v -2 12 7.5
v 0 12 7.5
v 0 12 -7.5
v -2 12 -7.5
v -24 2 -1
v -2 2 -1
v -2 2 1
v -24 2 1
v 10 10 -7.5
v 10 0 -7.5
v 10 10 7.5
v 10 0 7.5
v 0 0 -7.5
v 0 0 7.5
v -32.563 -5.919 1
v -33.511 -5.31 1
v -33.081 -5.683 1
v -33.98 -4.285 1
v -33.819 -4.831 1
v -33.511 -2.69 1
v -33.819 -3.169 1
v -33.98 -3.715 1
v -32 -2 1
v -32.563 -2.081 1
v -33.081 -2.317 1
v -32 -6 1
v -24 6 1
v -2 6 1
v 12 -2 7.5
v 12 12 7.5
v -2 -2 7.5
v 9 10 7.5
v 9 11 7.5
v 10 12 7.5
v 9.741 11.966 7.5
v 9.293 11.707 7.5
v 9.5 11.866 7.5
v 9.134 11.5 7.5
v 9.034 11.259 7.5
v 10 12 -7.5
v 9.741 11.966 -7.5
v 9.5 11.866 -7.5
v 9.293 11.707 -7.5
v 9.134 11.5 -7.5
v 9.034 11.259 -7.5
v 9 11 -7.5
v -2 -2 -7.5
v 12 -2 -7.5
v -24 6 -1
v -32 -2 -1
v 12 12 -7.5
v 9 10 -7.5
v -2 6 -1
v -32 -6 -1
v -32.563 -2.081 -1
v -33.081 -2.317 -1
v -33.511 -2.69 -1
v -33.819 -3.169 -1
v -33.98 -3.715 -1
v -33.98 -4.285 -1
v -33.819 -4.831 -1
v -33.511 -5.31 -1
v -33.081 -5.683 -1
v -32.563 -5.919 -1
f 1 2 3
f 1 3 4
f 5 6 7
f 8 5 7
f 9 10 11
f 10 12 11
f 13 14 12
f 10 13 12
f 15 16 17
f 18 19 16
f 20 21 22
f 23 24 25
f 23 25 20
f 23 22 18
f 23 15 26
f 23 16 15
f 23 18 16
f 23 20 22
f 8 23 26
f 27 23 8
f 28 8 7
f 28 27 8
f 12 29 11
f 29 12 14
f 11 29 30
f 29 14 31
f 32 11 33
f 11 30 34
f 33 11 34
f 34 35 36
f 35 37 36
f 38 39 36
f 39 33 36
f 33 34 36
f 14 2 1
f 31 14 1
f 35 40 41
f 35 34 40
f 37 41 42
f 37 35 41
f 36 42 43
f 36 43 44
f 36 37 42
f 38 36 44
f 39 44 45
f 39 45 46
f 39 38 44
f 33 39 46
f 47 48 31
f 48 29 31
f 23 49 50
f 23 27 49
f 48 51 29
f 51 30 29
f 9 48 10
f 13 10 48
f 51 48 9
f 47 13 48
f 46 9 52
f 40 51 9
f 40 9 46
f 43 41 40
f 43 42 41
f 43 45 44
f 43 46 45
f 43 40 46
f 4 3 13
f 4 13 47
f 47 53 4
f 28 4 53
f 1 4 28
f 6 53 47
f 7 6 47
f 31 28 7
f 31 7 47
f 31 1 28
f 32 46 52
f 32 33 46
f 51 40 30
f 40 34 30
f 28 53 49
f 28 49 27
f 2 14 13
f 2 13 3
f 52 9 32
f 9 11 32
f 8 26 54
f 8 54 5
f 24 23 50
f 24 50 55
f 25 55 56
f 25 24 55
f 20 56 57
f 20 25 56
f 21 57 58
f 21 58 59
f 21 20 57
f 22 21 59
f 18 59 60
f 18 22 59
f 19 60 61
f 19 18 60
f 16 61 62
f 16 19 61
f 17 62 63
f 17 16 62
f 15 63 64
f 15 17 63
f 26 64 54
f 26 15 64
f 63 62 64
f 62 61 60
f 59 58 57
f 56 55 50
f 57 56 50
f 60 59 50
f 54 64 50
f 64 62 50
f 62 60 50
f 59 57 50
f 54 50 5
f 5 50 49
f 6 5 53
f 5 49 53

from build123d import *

# Parameters (mm, degrees)
PAD_DEPTH    = 7.5
SKETCH001_W  = 4
SKETCH001_H  = 2
PAD001_DEPTH = 24
PAD002_DEPTH = 1


with BuildPart() as part:
    # Sketch → Pad (new body, symmetric)
    with BuildSketch(Plane.XY):
        with BuildLine():
            Line((0, 0), (10, 0))
            Line((10, 0), (10, 10))
            Line((10, 10), (9, 10))
            Line((9, 11), (9, 10))
            ThreePointArc((10, 12), (9.292893, 11.707107), (9, 11))
            Line((10, 12), (12, 12))
            Line((12, 12), (12, -2))
            Line((12, -2), (-2, -2))
            Line((-2, 12), (-2, -2))
            Line((0, 12), (-2, 12))
            Line((0, 0), (0, 12))
        make_face()
    extrude(amount=PAD_DEPTH, both=True)

    # Sketch001 → Pad001 (join)
    with BuildSketch(Plane.YZ):
        with Locations((4, 0)):
            Rectangle(SKETCH001_W, SKETCH001_H)
    extrude(amount=-PAD001_DEPTH)

    # Sketch002 → Pad002 (join, symmetric)
    with BuildSketch(Plane.XY):
        with BuildLine():
            Line((-24, 6), (-32, -2))
            ThreePointArc((-32, -2), (-34, -4), (-32, -6))
            Line((-32, -6), (-24, 2))
            Line((-24, 2), (-24, 6))
        make_face()
    extrude(amount=PAD002_DEPTH, both=True)


solid = part.part
